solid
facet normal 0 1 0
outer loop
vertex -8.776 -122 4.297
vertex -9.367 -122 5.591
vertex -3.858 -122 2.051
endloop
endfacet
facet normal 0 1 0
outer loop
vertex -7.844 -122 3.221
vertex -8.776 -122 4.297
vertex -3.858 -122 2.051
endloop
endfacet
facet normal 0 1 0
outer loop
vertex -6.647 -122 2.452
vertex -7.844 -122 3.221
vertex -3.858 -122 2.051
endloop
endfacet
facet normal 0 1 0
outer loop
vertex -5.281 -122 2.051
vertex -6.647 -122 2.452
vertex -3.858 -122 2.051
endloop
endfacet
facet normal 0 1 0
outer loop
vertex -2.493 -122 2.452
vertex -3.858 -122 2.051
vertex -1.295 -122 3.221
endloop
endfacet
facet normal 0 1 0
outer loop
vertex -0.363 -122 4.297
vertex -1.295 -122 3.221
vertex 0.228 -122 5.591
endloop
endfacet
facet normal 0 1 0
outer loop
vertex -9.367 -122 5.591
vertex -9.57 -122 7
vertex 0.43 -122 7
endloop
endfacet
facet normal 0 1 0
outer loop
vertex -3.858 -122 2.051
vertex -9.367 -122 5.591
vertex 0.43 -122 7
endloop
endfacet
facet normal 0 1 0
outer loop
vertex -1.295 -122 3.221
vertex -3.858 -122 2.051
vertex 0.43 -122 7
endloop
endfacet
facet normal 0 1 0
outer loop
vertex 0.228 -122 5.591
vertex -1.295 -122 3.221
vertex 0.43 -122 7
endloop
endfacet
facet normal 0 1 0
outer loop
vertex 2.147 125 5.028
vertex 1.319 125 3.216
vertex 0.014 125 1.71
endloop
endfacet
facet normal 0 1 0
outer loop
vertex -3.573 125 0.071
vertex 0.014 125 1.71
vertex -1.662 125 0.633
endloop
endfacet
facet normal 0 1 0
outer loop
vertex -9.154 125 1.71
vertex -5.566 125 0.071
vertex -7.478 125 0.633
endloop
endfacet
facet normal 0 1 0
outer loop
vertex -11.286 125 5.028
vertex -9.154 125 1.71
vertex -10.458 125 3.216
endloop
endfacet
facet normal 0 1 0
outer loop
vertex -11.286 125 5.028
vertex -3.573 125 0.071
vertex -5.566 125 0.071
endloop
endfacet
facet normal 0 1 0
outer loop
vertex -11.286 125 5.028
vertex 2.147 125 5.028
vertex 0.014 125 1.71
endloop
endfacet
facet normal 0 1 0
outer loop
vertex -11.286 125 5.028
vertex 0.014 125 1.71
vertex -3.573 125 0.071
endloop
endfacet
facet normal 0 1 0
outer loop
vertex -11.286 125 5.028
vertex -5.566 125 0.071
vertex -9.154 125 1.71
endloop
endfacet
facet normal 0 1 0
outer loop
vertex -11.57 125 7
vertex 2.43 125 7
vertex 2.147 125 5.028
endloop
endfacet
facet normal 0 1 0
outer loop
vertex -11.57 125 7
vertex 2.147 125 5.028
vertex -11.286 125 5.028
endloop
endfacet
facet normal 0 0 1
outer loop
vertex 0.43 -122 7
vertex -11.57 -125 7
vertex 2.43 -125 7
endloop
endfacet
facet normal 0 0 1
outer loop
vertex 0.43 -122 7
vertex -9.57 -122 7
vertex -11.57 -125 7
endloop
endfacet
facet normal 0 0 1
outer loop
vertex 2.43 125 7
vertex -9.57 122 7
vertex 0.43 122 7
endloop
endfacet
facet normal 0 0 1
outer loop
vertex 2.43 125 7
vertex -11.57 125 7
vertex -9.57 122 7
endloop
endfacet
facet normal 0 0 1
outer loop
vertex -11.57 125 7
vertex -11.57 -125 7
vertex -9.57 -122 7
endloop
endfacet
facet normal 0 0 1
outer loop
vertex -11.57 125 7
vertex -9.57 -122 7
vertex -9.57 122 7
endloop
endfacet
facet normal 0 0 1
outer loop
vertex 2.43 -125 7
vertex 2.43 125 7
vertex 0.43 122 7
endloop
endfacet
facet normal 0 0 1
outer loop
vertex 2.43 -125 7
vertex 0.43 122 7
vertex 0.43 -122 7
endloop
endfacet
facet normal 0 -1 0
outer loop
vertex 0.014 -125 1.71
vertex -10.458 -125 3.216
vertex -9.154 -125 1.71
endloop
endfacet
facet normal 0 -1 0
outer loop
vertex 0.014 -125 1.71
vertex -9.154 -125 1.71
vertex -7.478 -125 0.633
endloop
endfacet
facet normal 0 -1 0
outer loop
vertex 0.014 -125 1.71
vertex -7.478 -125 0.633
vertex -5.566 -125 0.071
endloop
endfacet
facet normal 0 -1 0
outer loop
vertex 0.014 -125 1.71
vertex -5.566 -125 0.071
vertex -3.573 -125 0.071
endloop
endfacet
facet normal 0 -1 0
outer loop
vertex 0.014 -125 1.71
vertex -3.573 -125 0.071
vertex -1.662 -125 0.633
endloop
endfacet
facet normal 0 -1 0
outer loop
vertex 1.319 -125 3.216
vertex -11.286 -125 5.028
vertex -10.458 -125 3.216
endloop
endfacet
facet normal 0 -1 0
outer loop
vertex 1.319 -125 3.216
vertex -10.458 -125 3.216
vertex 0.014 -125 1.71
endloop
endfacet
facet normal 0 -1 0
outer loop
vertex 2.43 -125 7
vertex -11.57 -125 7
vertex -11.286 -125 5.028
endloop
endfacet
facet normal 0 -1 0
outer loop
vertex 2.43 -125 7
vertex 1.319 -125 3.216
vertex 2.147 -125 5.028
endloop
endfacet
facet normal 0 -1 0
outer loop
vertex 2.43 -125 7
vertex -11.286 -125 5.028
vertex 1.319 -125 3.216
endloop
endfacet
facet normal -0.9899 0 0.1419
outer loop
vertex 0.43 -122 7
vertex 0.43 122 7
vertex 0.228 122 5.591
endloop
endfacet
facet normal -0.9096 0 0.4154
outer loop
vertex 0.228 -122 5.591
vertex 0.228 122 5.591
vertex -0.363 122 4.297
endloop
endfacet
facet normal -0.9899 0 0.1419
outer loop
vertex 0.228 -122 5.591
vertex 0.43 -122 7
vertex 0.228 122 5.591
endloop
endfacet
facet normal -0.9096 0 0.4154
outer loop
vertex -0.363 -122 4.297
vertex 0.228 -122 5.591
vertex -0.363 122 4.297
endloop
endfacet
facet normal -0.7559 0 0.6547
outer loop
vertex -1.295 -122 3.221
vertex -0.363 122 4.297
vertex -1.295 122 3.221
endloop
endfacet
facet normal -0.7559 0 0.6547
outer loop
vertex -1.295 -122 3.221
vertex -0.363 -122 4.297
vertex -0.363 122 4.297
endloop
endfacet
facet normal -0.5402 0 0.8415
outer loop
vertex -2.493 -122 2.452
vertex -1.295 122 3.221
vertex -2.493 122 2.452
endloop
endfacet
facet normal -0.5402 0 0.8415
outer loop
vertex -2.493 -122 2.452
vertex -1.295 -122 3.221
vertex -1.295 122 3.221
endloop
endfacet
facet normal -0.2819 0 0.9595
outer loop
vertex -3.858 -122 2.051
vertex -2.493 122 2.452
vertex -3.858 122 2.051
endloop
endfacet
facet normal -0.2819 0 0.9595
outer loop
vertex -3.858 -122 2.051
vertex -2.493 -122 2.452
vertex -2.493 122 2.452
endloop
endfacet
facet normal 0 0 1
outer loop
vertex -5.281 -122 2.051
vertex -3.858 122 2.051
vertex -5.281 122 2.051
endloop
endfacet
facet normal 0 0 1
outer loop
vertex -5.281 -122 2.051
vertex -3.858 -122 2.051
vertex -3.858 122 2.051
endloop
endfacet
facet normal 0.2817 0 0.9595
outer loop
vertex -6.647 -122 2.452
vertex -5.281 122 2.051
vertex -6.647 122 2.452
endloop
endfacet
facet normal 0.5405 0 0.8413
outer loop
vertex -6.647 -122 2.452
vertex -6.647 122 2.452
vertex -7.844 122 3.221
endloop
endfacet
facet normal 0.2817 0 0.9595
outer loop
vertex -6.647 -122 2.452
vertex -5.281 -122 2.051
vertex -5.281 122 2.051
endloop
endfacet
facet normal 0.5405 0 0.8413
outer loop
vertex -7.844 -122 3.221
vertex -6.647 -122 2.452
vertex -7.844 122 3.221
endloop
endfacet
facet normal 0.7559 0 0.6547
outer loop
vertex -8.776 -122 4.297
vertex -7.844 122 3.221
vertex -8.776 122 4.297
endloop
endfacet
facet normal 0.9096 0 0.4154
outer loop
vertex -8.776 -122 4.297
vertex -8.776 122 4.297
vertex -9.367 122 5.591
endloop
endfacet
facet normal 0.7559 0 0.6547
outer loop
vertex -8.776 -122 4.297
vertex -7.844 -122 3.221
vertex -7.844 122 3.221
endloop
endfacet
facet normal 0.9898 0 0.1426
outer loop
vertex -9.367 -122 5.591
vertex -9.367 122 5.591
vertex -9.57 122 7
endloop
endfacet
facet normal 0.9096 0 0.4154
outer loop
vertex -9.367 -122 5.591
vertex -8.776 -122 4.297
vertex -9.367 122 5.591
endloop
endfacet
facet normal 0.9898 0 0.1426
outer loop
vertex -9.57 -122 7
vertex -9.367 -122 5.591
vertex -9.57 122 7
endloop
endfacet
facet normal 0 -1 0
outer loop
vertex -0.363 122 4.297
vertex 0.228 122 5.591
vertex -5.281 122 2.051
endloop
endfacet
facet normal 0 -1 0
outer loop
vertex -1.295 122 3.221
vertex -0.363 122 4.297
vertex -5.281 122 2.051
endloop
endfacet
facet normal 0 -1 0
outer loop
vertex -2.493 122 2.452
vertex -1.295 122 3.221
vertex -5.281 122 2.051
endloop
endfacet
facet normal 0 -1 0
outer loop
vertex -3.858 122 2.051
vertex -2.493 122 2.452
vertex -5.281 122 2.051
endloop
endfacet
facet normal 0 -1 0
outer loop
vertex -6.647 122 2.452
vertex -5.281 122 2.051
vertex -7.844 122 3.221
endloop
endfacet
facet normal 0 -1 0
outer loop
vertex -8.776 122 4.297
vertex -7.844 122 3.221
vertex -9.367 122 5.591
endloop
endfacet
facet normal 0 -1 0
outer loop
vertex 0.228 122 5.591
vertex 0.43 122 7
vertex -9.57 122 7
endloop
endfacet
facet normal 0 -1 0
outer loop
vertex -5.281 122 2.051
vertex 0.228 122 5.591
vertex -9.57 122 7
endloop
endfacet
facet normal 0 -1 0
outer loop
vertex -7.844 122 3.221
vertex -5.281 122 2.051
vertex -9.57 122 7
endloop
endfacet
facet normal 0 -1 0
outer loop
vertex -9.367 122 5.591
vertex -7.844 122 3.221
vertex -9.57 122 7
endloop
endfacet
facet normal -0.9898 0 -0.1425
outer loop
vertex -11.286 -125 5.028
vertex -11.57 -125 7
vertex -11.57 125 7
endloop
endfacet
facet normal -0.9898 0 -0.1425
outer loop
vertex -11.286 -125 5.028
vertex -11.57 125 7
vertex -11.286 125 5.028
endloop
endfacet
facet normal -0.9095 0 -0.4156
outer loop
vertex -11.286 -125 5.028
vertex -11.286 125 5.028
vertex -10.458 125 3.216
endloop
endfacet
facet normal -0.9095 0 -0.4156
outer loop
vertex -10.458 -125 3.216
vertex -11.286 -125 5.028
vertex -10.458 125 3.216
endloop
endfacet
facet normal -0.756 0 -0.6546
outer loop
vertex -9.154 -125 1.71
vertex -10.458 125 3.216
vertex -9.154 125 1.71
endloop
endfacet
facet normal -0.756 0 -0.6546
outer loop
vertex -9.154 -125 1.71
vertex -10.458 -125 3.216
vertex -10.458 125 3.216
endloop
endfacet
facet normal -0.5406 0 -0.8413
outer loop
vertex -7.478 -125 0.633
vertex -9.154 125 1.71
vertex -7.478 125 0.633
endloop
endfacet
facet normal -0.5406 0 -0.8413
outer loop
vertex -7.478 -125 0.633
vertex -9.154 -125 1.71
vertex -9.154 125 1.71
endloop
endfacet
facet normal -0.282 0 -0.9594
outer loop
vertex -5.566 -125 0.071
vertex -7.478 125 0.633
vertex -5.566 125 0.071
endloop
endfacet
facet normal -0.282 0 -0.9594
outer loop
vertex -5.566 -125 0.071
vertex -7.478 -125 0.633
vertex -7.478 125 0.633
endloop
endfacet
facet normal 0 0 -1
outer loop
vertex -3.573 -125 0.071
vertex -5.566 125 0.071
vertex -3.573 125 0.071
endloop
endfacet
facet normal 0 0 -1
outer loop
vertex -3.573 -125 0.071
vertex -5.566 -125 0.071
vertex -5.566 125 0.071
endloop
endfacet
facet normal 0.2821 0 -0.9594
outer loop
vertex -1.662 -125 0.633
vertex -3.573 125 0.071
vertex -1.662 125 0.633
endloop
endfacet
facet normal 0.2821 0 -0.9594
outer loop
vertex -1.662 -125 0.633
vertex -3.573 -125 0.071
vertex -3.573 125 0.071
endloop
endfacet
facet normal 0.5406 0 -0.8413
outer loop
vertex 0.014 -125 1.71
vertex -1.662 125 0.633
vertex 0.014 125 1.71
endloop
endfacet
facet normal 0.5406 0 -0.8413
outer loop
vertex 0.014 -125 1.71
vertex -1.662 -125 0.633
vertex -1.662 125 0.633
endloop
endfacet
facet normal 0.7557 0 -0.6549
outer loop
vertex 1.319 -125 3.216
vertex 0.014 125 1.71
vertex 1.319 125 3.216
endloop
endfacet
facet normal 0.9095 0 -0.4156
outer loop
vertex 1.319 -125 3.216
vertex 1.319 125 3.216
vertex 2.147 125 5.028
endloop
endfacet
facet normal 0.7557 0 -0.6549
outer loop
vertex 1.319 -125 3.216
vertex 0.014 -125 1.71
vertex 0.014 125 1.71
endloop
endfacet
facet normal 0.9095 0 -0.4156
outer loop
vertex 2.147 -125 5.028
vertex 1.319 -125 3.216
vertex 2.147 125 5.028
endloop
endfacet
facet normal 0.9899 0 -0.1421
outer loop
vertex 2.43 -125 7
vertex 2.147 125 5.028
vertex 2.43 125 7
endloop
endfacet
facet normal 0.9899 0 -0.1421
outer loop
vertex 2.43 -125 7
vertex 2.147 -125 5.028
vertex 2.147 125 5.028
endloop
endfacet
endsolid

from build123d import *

# Parameters (mm, degrees)
F1_DEPTH = 125
F3_DEPTH = 3
F5_DEPTH = 3


with BuildPart() as f1:
    # F0 (on Front) → F1 (new body, symmetric)
    with BuildSketch(Plane.XZ):
        with BuildLine():
            Line((-9.569632, 7), (-11.569632, 7))
            ThreePointArc((-11.569632, 7), (-4.569632, 0), (2.430368, 7))
            Line((2.430368, 7), (0.430368, 7))
            ThreePointArc((0.430368, 7), (-4.569632, 2), (-9.569632, 7))
        make_face()
    extrude(amount=F1_DEPTH, both=True)

    # F2 (on face) → F3 (join)
    with BuildSketch(Plane.XZ.offset(125)):
        with BuildLine():
            Line((0.430368, 7), (-9.569632, 7))
            ThreePointArc((-9.569632, 7), (-4.569632, 2), (0.430368, 7))
        make_face()
    extrude(amount=-F3_DEPTH)

    # F4 (on face) → F5 (join)
    with BuildSketch(Plane(origin=(0, 125, 0), x_dir=(-1, 0, 0), z_dir=(0, 1, 0))):
        with BuildLine():
            Line((9.569632, 7), (-0.430368, 7))
            ThreePointArc((-0.430368, 7), (4.569632, 2), (9.569632, 7))
        make_face()
    extrude(amount=-F5_DEPTH)


solid = f1.part
